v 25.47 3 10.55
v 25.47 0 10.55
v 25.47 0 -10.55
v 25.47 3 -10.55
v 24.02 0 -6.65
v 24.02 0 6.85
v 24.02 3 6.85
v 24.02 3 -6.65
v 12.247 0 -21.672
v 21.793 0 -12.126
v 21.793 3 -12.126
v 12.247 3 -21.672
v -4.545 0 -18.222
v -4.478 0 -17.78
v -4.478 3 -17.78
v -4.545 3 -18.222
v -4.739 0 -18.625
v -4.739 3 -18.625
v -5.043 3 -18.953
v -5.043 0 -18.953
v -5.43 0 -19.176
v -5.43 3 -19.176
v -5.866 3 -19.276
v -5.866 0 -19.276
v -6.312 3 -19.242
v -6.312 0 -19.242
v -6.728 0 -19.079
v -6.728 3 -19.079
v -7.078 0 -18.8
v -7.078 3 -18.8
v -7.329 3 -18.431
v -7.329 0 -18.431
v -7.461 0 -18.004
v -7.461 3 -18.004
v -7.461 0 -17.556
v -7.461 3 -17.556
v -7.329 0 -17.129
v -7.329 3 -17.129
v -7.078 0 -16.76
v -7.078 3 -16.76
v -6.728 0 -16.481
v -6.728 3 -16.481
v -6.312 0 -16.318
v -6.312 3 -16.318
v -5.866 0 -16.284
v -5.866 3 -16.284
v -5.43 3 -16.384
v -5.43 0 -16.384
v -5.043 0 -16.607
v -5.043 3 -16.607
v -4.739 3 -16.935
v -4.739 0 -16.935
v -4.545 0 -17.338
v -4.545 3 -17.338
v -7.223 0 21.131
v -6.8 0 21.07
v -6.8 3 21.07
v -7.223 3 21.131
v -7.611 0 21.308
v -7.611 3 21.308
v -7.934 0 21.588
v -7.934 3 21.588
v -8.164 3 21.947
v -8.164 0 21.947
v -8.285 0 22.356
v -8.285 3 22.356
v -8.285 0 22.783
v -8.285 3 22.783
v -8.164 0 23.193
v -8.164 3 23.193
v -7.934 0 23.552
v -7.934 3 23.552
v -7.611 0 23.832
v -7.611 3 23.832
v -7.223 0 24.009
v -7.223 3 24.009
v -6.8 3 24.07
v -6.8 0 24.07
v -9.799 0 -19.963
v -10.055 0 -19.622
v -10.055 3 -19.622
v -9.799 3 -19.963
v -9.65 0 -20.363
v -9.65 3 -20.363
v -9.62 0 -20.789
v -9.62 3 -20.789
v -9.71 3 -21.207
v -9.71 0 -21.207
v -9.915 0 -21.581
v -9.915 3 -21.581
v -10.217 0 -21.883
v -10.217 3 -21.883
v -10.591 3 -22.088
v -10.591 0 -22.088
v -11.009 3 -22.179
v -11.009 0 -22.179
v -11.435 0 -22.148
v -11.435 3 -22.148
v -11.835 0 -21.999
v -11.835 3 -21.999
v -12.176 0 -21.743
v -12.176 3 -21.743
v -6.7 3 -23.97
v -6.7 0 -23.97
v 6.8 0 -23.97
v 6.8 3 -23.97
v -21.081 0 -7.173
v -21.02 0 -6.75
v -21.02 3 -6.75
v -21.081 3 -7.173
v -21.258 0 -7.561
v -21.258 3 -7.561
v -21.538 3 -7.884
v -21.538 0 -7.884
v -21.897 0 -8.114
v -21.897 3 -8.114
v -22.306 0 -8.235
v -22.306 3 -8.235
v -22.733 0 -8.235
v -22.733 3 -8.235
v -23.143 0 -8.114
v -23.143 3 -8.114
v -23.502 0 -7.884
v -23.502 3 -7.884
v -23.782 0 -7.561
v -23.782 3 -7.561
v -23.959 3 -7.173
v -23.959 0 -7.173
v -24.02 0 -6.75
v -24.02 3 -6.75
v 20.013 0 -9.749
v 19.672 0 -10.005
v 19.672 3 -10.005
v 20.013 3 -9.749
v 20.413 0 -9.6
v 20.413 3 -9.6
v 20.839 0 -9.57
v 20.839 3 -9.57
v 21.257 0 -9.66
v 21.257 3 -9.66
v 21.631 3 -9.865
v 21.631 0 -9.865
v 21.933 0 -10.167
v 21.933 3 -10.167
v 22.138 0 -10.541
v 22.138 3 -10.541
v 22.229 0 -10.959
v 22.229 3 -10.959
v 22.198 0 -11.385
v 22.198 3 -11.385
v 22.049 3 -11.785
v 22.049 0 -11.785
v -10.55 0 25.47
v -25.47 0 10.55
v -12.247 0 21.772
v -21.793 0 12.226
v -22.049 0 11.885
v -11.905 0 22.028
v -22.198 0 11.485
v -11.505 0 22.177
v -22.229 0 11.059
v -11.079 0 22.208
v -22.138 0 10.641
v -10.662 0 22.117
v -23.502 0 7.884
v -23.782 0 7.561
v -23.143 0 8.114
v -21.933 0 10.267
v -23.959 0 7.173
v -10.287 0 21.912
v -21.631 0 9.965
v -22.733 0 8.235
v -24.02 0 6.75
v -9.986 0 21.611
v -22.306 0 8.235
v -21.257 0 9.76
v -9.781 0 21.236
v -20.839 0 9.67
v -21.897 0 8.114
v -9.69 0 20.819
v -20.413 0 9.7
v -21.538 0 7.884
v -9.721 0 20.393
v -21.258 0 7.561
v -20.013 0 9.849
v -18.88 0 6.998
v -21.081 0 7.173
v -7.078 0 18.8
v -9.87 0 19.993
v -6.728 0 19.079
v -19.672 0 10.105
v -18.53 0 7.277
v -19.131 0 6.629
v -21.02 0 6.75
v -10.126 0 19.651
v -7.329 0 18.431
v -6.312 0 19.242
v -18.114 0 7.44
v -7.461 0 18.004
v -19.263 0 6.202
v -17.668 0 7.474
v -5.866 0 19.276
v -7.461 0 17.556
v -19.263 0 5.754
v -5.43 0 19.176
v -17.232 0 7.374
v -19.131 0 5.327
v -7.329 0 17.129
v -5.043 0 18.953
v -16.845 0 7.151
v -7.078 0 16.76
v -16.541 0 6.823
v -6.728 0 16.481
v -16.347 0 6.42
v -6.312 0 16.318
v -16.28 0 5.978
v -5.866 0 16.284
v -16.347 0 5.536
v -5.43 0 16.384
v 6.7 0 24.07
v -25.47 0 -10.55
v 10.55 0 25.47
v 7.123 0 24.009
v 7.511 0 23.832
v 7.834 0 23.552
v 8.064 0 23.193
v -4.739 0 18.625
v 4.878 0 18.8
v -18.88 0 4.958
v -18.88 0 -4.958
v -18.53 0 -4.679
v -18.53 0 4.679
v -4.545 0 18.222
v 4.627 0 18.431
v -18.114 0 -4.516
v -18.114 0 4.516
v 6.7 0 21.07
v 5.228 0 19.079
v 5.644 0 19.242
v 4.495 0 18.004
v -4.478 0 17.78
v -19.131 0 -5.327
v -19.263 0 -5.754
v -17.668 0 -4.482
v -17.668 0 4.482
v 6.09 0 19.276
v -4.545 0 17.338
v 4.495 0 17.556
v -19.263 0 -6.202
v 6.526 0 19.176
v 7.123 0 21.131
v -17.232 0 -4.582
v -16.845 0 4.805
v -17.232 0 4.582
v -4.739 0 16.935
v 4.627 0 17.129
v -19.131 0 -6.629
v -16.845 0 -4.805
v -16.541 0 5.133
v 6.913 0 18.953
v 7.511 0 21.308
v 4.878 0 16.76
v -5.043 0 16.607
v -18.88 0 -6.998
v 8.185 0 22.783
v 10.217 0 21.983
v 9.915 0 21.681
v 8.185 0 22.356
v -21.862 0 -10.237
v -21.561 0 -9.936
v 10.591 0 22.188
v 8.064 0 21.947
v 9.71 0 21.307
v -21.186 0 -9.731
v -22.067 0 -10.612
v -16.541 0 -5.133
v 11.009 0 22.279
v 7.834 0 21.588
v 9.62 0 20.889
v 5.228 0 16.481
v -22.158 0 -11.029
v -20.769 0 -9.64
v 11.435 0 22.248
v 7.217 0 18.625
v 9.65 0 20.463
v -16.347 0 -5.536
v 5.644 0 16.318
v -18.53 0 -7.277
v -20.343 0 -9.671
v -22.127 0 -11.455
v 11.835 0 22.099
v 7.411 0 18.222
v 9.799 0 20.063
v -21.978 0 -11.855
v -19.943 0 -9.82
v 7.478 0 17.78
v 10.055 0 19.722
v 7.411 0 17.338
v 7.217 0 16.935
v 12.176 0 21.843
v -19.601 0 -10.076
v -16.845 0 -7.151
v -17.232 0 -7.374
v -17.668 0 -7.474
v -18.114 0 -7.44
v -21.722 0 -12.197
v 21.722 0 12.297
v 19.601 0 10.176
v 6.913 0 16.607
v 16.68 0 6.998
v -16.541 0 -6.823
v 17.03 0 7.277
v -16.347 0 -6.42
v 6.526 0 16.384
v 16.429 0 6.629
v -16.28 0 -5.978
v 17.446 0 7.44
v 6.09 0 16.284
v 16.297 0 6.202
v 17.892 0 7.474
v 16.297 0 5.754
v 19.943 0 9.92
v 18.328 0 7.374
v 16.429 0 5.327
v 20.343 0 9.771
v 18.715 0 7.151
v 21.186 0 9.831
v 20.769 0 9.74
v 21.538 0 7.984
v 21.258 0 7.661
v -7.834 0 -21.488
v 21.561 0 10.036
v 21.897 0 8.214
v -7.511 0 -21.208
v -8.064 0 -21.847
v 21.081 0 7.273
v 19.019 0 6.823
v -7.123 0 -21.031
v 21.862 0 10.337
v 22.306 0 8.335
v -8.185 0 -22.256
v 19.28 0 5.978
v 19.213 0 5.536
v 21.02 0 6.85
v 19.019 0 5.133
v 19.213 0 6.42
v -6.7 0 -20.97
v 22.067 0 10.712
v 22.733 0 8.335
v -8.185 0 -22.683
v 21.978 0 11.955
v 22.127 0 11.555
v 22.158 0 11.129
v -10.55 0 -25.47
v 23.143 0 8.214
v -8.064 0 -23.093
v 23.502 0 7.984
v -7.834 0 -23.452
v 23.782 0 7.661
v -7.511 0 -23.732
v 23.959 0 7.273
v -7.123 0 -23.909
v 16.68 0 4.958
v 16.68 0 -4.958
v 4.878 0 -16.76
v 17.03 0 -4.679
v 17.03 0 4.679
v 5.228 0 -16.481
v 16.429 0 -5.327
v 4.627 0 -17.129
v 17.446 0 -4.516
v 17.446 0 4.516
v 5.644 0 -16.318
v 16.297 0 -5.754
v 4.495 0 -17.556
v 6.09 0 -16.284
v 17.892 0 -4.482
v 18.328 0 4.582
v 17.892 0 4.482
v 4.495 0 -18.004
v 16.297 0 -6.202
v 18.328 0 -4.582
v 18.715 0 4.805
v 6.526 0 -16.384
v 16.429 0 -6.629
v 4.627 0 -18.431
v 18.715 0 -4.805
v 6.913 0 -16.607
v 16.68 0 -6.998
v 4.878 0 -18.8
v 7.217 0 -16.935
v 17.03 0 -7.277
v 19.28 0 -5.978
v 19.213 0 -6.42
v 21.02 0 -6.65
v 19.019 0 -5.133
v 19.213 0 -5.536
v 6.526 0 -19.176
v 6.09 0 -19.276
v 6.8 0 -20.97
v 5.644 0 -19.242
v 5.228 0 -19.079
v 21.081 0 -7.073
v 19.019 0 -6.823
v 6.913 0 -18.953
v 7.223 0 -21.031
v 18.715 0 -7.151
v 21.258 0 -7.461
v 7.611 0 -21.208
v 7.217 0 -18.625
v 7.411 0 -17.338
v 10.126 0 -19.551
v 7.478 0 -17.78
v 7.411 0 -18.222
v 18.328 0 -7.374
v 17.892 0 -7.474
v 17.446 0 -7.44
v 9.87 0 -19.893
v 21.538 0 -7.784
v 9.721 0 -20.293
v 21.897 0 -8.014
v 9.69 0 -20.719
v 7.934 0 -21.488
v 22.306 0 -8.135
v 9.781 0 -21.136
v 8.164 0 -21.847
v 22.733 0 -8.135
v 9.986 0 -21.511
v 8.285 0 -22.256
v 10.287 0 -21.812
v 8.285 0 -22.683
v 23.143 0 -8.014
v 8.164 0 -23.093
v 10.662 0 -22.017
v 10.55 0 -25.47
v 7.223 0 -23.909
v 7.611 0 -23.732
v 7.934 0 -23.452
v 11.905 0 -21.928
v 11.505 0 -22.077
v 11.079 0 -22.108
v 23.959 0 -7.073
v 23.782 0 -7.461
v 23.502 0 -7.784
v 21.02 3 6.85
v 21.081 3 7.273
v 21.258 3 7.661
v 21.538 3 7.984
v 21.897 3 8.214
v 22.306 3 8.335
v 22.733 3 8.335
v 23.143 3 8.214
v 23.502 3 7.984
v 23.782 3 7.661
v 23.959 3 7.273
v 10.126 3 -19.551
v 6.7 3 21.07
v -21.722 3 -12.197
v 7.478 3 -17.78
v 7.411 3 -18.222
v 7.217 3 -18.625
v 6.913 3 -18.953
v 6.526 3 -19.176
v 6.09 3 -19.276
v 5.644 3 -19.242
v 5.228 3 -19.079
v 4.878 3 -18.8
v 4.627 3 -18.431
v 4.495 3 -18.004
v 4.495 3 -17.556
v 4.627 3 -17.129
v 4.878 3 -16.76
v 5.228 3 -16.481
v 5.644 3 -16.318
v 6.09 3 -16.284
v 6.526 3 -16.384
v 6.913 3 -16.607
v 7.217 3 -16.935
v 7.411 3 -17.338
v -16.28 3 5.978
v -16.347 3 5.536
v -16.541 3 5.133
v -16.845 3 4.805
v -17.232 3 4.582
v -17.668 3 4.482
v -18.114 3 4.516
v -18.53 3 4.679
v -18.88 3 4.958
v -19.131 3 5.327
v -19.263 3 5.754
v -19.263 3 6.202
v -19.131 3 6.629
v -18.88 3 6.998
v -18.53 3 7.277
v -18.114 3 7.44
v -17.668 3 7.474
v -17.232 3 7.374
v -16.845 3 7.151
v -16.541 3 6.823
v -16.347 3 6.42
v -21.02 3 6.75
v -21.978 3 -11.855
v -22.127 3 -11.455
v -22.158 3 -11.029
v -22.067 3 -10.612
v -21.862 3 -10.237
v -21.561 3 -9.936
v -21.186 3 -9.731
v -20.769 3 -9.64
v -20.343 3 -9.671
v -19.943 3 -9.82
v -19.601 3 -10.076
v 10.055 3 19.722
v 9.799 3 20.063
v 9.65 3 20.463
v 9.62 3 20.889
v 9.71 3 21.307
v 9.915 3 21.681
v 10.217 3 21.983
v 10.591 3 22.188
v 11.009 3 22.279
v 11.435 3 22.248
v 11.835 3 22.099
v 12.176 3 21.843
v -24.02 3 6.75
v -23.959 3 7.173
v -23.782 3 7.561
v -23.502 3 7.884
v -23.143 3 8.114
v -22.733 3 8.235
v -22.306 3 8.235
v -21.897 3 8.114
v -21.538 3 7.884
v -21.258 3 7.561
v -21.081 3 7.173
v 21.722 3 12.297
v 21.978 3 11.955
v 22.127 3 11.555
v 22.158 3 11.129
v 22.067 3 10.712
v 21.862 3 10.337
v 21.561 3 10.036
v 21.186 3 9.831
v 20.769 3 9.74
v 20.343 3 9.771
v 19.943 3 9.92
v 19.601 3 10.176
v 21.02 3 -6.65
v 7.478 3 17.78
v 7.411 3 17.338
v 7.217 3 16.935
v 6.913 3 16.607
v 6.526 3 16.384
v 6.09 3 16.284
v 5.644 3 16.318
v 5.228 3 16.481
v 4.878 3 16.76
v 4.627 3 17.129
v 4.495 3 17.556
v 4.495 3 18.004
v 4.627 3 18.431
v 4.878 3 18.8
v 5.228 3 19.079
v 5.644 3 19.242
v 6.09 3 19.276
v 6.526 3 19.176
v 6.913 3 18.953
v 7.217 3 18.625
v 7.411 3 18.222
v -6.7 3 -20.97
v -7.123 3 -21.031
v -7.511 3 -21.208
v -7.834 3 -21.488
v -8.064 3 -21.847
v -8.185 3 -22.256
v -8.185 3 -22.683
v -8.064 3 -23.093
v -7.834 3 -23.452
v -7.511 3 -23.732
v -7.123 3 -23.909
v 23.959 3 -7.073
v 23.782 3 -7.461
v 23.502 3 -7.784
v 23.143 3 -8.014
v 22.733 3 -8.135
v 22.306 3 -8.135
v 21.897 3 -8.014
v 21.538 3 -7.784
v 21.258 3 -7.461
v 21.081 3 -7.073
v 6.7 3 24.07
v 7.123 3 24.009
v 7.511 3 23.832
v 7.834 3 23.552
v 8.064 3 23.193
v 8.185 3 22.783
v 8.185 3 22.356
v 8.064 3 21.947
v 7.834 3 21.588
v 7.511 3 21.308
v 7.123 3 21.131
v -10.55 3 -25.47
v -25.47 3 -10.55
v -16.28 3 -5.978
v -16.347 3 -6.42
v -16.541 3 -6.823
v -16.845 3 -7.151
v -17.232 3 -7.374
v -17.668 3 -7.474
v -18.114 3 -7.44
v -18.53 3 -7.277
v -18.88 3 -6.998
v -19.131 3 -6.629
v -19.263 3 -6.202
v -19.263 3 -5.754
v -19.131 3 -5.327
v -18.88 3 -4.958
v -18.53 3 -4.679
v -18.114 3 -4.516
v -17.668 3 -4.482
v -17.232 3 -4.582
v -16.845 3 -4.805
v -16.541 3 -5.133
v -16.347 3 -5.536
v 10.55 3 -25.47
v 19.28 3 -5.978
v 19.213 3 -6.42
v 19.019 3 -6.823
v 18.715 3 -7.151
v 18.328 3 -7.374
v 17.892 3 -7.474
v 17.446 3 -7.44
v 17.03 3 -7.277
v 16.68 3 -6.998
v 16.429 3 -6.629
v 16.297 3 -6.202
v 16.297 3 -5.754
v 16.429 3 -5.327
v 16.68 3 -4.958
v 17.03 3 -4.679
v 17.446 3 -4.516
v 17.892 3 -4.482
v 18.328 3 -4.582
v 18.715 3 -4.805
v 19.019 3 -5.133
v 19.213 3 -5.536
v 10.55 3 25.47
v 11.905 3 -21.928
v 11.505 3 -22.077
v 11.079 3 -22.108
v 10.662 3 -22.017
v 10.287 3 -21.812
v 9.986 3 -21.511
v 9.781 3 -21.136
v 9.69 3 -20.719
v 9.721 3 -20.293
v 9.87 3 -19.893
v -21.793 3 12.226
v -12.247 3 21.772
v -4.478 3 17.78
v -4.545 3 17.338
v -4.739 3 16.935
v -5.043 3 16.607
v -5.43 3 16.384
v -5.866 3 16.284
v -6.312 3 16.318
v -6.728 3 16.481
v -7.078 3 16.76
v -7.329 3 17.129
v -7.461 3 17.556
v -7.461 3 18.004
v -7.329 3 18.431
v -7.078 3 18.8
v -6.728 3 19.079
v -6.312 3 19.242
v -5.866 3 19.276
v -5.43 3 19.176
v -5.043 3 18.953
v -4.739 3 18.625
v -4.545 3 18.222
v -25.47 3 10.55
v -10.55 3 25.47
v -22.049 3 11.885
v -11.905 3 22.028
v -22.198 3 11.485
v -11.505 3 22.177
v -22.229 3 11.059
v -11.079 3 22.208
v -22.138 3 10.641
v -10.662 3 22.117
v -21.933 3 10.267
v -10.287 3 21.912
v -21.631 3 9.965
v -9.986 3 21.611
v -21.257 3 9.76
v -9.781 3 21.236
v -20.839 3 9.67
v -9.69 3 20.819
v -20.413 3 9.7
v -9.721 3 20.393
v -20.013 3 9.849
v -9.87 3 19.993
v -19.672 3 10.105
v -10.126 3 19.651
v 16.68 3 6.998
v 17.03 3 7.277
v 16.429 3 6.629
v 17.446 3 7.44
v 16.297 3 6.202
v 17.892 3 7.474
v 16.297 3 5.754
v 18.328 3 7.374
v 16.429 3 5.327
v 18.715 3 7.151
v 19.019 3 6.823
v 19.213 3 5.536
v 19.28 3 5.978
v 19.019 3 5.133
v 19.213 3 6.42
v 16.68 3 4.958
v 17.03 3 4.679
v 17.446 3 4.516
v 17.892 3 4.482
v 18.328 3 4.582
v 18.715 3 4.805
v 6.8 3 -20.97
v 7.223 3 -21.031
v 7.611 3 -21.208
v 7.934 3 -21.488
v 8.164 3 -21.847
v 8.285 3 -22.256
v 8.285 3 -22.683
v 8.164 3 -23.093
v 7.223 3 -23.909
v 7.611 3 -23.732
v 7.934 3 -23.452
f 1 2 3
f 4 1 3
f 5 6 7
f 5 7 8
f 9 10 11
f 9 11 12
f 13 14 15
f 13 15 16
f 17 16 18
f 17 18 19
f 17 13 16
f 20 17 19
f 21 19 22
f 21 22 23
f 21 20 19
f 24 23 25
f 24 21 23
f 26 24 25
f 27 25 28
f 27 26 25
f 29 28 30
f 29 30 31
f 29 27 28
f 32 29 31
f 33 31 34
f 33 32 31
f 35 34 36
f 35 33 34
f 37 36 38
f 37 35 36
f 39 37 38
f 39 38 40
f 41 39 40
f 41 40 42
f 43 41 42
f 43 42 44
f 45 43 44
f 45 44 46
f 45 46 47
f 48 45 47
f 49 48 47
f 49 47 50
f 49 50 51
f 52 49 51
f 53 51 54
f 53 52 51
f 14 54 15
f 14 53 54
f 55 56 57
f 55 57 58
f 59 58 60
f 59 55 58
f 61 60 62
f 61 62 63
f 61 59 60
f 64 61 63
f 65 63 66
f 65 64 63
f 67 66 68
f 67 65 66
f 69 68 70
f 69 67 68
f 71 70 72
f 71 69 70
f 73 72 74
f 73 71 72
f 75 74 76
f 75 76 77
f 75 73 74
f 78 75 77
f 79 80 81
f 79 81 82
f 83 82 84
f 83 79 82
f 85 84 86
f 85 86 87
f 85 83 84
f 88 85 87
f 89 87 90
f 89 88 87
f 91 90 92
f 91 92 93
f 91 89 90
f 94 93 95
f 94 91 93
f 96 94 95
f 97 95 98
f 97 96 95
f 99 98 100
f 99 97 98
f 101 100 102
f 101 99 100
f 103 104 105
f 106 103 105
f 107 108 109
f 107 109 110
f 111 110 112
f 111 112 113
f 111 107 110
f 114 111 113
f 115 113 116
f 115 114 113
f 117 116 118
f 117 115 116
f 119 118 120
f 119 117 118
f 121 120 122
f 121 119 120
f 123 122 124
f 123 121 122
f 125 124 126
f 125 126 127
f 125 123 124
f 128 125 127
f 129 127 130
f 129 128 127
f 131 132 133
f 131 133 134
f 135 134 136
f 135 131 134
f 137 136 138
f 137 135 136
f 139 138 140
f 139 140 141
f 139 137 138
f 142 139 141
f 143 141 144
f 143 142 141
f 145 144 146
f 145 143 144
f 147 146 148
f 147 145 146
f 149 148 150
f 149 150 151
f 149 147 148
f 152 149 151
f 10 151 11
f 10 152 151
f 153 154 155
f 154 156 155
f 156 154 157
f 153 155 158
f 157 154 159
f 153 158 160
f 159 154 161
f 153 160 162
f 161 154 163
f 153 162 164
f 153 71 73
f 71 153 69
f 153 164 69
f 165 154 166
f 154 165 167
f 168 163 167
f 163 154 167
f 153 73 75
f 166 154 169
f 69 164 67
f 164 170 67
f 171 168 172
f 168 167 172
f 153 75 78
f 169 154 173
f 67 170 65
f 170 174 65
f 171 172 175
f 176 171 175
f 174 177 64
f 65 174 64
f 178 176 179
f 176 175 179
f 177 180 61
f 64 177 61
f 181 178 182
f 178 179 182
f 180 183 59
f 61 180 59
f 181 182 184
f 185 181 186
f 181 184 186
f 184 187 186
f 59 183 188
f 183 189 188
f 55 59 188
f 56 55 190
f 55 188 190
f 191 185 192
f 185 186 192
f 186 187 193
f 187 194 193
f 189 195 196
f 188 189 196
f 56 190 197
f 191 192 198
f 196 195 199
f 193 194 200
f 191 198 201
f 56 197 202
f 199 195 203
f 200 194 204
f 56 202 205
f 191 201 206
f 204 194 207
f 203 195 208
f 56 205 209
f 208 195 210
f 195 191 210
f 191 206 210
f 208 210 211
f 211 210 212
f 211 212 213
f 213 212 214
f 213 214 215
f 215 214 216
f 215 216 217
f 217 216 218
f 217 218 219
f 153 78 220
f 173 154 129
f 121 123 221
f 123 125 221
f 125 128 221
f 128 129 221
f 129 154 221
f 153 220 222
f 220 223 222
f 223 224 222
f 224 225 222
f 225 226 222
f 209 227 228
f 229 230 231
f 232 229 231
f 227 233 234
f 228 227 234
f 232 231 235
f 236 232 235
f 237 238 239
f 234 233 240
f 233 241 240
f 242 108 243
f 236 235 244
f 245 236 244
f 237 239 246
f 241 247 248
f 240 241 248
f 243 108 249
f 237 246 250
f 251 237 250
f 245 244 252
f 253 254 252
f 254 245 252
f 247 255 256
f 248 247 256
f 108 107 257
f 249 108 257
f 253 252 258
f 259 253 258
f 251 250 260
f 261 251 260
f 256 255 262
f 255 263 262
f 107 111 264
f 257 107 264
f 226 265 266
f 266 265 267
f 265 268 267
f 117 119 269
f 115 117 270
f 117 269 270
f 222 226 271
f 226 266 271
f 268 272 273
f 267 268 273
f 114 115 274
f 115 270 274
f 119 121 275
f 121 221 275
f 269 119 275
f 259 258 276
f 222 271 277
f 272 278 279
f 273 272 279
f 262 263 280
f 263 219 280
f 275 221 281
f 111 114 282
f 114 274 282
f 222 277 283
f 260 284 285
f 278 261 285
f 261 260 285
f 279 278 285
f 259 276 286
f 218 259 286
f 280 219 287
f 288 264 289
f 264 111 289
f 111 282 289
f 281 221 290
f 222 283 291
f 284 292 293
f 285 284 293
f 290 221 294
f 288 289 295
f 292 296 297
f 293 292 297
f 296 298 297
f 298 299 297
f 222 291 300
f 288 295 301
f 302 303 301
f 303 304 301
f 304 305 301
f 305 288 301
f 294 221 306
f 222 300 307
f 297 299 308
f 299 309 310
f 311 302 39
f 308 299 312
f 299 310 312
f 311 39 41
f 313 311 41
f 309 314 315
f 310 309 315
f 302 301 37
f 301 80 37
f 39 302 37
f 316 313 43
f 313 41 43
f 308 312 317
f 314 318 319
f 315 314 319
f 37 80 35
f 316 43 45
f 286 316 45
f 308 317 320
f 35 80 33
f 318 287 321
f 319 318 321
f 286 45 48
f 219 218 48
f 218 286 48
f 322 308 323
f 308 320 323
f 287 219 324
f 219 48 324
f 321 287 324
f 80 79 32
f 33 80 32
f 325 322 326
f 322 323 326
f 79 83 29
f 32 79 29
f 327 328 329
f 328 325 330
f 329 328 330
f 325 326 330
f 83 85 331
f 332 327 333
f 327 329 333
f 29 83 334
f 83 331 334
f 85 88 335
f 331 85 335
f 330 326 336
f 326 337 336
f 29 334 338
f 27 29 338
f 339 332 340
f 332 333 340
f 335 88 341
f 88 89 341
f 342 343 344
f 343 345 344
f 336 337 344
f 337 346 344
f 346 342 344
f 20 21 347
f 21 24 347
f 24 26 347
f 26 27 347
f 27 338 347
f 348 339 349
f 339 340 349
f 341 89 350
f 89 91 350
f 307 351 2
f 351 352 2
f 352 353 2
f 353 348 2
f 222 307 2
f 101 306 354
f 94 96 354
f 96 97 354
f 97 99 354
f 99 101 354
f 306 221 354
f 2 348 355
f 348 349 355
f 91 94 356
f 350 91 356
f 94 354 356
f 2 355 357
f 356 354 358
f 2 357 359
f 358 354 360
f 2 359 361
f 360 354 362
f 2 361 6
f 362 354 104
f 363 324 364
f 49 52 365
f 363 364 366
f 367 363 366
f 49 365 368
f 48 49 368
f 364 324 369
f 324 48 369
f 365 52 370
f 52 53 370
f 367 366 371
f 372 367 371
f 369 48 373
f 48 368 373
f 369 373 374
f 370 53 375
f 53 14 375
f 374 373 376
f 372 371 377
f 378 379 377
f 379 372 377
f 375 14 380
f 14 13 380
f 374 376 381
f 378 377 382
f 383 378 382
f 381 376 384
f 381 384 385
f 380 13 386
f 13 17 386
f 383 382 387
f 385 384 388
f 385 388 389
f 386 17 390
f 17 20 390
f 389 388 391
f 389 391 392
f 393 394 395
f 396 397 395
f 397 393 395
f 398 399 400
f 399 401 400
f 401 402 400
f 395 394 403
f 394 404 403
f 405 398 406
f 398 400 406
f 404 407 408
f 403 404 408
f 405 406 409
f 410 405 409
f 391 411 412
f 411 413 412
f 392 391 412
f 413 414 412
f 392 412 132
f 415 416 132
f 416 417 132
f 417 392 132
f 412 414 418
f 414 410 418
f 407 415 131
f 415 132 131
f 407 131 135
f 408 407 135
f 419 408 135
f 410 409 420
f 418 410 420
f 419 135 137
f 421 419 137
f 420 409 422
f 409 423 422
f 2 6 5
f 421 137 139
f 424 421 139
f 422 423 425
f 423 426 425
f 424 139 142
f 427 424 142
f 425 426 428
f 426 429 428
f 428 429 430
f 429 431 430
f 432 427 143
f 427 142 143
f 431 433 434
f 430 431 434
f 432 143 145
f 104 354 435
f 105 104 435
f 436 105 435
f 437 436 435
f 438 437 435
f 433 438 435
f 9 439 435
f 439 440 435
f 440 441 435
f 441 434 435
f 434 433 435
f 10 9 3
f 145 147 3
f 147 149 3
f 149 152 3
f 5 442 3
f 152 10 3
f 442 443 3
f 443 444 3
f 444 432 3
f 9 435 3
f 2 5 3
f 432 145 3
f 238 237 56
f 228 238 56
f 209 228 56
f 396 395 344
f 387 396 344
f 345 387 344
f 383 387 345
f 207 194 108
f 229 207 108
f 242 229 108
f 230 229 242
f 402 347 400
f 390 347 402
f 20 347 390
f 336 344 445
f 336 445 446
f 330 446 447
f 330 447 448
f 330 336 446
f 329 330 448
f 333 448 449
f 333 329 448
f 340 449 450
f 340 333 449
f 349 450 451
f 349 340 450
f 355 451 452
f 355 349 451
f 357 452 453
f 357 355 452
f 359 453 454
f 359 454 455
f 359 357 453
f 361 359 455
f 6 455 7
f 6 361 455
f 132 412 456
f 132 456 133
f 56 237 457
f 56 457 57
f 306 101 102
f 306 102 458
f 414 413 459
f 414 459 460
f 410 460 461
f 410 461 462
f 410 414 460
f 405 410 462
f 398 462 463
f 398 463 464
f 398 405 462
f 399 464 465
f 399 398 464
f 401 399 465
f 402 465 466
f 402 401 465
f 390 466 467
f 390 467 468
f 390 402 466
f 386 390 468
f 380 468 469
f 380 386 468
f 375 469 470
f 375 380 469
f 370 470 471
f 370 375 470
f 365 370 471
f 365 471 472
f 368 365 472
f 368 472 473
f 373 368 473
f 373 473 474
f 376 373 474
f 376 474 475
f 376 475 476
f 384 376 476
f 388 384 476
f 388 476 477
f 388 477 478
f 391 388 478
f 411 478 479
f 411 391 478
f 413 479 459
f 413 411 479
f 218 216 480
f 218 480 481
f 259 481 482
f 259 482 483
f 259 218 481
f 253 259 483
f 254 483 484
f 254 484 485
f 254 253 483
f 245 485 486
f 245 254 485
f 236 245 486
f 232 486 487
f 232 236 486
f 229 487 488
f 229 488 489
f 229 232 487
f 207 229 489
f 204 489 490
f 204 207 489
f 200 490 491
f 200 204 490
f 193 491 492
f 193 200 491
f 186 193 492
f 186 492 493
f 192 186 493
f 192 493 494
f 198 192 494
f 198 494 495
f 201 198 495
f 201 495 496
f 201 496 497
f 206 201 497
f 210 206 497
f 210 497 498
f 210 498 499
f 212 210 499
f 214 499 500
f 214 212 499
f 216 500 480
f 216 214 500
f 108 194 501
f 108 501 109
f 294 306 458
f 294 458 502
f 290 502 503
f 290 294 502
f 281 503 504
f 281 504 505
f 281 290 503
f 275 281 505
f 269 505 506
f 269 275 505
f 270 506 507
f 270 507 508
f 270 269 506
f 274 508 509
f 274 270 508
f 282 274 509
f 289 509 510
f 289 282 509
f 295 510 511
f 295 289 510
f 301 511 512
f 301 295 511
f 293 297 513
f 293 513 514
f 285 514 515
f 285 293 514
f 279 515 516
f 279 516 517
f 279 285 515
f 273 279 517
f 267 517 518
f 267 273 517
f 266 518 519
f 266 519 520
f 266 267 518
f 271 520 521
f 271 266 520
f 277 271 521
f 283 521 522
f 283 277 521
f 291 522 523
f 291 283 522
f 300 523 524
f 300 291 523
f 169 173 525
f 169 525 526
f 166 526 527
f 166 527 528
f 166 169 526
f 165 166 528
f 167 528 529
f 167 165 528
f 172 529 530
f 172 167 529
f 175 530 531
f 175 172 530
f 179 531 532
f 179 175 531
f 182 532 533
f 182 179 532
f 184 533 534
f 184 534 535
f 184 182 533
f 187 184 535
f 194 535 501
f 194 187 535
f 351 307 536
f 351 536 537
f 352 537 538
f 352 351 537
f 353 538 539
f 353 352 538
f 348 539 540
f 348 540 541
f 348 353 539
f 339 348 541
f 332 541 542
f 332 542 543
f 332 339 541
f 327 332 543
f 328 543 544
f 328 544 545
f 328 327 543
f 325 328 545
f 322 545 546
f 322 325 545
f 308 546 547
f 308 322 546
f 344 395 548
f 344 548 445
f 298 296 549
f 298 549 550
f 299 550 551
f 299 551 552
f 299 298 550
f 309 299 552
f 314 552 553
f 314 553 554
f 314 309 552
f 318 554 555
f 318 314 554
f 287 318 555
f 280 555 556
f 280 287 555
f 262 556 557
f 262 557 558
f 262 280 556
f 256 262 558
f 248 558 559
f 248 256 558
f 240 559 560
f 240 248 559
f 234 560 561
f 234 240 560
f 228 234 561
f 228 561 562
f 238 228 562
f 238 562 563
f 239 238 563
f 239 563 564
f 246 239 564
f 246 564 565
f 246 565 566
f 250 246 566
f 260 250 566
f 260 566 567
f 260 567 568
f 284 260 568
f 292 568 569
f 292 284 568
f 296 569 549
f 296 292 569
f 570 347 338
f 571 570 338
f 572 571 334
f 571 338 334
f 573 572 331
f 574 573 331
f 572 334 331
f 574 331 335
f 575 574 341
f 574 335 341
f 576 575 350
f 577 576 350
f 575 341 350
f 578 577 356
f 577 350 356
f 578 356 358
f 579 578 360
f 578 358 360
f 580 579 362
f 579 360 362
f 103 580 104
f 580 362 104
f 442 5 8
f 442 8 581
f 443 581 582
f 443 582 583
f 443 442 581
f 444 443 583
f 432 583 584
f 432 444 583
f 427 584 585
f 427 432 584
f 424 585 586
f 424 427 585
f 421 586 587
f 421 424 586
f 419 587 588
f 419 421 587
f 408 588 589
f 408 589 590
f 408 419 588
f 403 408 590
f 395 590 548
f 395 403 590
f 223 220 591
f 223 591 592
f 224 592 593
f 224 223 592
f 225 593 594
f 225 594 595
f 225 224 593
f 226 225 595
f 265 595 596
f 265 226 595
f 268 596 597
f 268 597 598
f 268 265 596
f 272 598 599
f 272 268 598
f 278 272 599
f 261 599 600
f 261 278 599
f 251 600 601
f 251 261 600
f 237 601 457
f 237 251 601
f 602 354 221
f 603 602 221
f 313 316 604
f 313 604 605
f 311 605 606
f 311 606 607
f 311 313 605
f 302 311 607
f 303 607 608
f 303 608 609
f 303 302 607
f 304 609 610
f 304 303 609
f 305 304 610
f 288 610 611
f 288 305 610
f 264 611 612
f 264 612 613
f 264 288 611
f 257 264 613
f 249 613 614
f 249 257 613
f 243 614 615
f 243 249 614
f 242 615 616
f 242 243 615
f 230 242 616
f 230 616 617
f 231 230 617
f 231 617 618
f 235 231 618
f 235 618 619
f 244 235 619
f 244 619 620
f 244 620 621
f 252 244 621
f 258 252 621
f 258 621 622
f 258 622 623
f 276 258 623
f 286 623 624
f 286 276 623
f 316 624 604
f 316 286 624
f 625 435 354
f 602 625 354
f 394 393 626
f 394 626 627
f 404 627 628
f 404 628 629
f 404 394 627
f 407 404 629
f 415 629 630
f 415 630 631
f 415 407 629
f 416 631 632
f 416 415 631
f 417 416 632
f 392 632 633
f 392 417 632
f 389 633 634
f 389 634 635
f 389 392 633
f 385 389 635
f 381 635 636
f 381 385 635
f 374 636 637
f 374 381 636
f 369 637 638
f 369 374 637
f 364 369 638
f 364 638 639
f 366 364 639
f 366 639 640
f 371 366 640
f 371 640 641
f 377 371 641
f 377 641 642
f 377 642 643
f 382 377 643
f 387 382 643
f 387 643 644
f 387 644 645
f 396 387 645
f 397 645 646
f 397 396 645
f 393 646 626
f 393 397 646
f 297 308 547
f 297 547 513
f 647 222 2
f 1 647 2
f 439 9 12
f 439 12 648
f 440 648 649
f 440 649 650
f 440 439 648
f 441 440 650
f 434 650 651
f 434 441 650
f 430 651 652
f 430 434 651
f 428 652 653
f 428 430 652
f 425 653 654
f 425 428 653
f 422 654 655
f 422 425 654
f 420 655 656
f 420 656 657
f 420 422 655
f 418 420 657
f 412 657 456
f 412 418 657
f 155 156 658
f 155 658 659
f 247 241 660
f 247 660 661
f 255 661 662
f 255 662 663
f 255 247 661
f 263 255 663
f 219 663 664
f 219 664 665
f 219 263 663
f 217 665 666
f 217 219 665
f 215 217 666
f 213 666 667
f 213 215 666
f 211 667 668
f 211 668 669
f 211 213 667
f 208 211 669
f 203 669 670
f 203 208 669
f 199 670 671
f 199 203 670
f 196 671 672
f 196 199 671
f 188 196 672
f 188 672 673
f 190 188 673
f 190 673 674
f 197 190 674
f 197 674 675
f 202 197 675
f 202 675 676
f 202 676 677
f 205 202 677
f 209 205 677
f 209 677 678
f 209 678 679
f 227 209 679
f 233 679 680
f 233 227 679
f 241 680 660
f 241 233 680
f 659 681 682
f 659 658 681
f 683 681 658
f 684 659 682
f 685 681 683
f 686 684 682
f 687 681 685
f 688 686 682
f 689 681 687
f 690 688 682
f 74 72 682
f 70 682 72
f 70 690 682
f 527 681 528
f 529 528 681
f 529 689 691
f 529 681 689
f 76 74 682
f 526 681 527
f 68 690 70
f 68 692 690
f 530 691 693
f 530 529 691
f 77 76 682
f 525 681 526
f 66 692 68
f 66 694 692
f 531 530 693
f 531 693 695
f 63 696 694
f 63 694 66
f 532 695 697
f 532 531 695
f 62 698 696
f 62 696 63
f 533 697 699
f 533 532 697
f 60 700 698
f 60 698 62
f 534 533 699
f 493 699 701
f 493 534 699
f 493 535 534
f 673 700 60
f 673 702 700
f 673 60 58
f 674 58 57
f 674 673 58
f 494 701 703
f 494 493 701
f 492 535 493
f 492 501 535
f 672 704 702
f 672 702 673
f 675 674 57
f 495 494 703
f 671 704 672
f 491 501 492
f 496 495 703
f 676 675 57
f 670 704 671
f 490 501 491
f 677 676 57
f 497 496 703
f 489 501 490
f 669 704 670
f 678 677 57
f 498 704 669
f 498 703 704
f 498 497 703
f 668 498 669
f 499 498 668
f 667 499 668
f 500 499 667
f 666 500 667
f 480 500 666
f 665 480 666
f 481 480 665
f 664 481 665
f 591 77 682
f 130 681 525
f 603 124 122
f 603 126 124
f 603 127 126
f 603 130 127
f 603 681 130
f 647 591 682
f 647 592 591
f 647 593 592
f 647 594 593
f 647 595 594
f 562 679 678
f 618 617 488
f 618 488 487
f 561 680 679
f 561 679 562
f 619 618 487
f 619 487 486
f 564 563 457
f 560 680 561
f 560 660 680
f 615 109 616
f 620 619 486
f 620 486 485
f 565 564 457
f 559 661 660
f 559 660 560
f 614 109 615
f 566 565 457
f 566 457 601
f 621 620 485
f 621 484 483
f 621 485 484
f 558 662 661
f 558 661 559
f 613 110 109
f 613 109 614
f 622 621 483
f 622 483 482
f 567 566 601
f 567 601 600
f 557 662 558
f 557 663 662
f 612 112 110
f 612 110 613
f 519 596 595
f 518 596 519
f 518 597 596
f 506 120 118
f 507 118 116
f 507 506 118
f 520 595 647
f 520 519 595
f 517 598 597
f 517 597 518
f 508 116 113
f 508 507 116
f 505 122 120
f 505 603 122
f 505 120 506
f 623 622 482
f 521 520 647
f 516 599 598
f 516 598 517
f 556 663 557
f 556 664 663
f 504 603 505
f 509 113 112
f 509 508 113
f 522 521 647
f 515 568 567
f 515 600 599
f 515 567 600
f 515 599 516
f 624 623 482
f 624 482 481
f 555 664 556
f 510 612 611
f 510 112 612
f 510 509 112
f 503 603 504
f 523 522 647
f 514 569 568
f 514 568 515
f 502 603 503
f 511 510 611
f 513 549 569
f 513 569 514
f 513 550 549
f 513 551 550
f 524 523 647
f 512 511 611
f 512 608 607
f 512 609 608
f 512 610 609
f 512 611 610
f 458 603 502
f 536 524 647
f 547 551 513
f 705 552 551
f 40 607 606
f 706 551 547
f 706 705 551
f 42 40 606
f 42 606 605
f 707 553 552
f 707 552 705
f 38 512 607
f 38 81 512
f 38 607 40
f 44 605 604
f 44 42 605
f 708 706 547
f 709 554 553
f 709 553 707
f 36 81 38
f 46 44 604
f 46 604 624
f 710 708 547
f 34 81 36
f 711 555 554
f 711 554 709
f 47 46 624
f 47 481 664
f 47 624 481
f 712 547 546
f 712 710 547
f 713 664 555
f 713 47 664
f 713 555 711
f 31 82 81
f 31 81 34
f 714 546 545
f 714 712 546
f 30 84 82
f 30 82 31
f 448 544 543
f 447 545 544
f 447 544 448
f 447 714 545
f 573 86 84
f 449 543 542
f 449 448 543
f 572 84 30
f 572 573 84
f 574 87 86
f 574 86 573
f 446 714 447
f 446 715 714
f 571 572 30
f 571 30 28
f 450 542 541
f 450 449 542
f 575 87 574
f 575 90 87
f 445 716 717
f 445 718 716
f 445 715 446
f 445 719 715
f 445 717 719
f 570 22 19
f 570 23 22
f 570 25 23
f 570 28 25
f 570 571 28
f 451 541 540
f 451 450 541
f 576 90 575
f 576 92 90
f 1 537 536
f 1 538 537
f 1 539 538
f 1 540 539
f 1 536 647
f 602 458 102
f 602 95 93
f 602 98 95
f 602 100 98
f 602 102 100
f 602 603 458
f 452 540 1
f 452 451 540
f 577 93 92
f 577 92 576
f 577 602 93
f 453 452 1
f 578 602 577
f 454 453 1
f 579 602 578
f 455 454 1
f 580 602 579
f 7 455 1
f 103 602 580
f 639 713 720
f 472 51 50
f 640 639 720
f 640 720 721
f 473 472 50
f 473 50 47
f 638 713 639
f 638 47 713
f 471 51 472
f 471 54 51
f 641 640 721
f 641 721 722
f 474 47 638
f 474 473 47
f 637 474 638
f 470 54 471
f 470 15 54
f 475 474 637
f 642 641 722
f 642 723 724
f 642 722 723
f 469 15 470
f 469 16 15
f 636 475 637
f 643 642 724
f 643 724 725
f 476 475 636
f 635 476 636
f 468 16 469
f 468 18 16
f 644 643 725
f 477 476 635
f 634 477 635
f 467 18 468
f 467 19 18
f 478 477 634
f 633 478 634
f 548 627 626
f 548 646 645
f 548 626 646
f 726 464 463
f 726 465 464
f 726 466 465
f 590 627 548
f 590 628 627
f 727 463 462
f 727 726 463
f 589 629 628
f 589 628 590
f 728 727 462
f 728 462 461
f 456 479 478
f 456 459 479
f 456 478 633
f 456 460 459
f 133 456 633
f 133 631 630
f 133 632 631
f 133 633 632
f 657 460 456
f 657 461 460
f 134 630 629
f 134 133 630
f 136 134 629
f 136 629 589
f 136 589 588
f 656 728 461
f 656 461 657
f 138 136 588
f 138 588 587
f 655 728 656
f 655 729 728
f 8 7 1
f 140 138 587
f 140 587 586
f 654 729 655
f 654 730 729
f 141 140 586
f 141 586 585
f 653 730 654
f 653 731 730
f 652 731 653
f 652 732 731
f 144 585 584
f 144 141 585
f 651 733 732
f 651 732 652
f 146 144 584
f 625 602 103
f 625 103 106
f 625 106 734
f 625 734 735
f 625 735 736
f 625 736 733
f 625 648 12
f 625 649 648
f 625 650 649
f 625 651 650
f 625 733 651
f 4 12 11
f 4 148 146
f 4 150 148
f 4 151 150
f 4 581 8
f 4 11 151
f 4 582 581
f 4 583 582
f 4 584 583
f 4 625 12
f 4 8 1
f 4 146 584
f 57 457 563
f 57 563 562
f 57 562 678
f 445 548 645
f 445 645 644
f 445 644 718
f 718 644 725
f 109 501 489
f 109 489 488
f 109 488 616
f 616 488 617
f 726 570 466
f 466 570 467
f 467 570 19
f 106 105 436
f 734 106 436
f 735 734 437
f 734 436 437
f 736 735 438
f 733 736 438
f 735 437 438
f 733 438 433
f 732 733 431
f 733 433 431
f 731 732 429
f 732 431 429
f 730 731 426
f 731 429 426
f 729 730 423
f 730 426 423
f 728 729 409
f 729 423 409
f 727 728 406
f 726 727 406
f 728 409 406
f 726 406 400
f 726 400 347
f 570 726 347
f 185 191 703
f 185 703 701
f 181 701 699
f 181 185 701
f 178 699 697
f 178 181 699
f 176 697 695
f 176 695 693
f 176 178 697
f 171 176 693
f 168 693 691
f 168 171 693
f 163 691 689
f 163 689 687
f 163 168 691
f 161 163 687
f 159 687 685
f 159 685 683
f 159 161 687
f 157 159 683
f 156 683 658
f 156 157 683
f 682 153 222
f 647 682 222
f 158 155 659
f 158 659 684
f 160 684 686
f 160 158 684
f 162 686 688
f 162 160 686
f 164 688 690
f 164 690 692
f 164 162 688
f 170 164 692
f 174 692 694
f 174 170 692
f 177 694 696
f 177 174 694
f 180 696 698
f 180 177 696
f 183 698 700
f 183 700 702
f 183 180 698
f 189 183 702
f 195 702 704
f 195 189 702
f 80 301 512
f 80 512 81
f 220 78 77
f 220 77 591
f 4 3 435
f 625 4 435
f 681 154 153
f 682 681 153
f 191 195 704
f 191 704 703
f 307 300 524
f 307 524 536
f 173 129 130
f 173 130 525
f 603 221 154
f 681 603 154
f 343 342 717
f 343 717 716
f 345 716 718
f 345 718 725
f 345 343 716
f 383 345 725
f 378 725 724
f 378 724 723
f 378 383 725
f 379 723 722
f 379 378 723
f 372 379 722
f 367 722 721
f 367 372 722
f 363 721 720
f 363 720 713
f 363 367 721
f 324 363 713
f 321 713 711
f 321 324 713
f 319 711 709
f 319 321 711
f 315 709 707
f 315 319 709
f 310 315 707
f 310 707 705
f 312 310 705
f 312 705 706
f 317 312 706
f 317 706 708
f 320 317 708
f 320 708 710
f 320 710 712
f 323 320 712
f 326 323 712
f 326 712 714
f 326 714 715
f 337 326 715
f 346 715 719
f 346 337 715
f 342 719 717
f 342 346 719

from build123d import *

# Parameters (mm, degrees)
SKETCH1_R           = 1.5
BOSS_EXTRUDE1_DEPTH = 3


with BuildPart() as part:
    # Sketch1 → Boss-Extrude1 (new body)
    with BuildSketch(Plane(origin=(0, 0, 0), x_dir=(1, 0, 0), z_dir=(0, 1, 0))):
        Polygon((10.55, -25.469953083), (25.469953083, -10.55), (25.469953083, 10.55), (10.55, 25.469953083), (-10.55, 25.469953083), (-25.469953083, 10.55), (-25.469953083, -10.55), (-10.55, -25.469953083), align=None)
        with Locations((-17.78, 5.978)):
            Circle(SKETCH1_R, mode=Mode.SUBTRACT)
        with Locations((-17.78, -5.978)):
            Circle(SKETCH1_R, mode=Mode.SUBTRACT)
        with Locations((5.978, 17.78)):
            Circle(SKETCH1_R, mode=Mode.SUBTRACT)
        with Locations((-5.978, 17.78)):
            Circle(SKETCH1_R, mode=Mode.SUBTRACT)
        with Locations((17.78, -5.978)):
            Circle(SKETCH1_R, mode=Mode.SUBTRACT)
        with Locations((17.78, 5.978)):
            Circle(SKETCH1_R, mode=Mode.SUBTRACT)
        with Locations((-5.978, -17.78)):
            Circle(SKETCH1_R, mode=Mode.SUBTRACT)
        with Locations((5.978, -17.78)):
            Circle(SKETCH1_R, mode=Mode.SUBTRACT)
        with BuildLine():
            Line((-6.7, 23.969953083), (6.8, 23.969953083))
            ThreePointArc((6.8, 23.969953083), (8.3, 22.469953083), (6.8, 20.969953083))
            Line((6.8, 20.969953083), (-6.7, 20.969953083))
            ThreePointArc((-6.7, 20.969953083), (-8.2, 22.469953083), (-6.7, 23.969953083))
        make_face(mode=Mode.SUBTRACT)
        with BuildLine():
            Line((10.125735931, 19.550966799), (19.671677477, 10.005025253))
            ThreePointArc((19.671677477, 10.005025253), (21.792997821, 10.005025253), (21.792997821, 12.126345597))
            Line((21.792997821, 12.126345597), (12.247056275, 21.672287143))
            ThreePointArc((12.247056275, 21.672287143), (10.125735931, 21.672287143), (10.125735931, 19.550966799))
        make_face(mode=Mode.SUBTRACT)
        with BuildLine():
            Line((21.019953083, 6.65), (21.019953083, -6.85))
            ThreePointArc((21.019953083, -6.85), (22.519953083, -8.35), (24.019953083, -6.85))
            Line((24.019953083, -6.85), (24.019953083, 6.65))
            ThreePointArc((24.019953083, 6.65), (22.519953083, 8.15), (21.019953083, 6.65))
        make_face(mode=Mode.SUBTRACT)
        with BuildLine():
            Line((19.600966799, -10.175735931), (10.055025253, -19.721677477))
            ThreePointArc((10.055025253, -19.721677477), (10.055025253, -21.842997821), (12.176345597, -21.842997821))
            Line((12.176345597, -21.842997821), (21.722287143, -12.297056275))
            ThreePointArc((21.722287143, -12.297056275), (21.722287143, -10.175735931), (19.600966799, -10.175735931))
        make_face(mode=Mode.SUBTRACT)
        with BuildLine():
            Line((6.7, -21.069953083), (-6.8, -21.069953083))
            ThreePointArc((-6.8, -21.069953083), (-8.3, -22.569953083), (-6.8, -24.069953083))
            Line((-6.8, -24.069953083), (6.7, -24.069953083))
            ThreePointArc((6.7, -24.069953083), (8.2, -22.569953083), (6.7, -21.069953083))
        make_face(mode=Mode.SUBTRACT)
        with BuildLine():
            Line((-10.125735931, -19.650966799), (-19.671677477, -10.105025253))
            ThreePointArc((-19.671677477, -10.105025253), (-21.792997821, -10.105025253), (-21.792997821, -12.226345597))
            Line((-21.792997821, -12.226345597), (-12.247056275, -21.772287143))
            ThreePointArc((-12.247056275, -21.772287143), (-10.125735931, -21.772287143), (-10.125735931, -19.650966799))
        make_face(mode=Mode.SUBTRACT)
        with BuildLine():
            Line((-21.019953083, -6.75), (-21.019953083, 6.75))
            ThreePointArc((-21.019953083, 6.75), (-22.519953083, 8.25), (-24.019953083, 6.75))
            Line((-24.019953083, 6.75), (-24.019953083, -6.75))
            ThreePointArc((-24.019953083, -6.75), (-22.519953083, -8.25), (-21.019953083, -6.75))
        make_face(mode=Mode.SUBTRACT)
        with BuildLine():
            Line((-19.600966799, 10.075735931), (-10.055025253, 19.621677477))
            ThreePointArc((-10.055025253, 19.621677477), (-10.055025253, 21.742997821), (-12.176345597, 21.742997821))
            Line((-12.176345597, 21.742997821), (-21.722287143, 12.197056275))
            ThreePointArc((-21.722287143, 12.197056275), (-21.722287143, 10.075735931), (-19.600966799, 10.075735931))
        make_face(mode=Mode.SUBTRACT)
    extrude(amount=BOSS_EXTRUDE1_DEPTH)


solid = part.part
